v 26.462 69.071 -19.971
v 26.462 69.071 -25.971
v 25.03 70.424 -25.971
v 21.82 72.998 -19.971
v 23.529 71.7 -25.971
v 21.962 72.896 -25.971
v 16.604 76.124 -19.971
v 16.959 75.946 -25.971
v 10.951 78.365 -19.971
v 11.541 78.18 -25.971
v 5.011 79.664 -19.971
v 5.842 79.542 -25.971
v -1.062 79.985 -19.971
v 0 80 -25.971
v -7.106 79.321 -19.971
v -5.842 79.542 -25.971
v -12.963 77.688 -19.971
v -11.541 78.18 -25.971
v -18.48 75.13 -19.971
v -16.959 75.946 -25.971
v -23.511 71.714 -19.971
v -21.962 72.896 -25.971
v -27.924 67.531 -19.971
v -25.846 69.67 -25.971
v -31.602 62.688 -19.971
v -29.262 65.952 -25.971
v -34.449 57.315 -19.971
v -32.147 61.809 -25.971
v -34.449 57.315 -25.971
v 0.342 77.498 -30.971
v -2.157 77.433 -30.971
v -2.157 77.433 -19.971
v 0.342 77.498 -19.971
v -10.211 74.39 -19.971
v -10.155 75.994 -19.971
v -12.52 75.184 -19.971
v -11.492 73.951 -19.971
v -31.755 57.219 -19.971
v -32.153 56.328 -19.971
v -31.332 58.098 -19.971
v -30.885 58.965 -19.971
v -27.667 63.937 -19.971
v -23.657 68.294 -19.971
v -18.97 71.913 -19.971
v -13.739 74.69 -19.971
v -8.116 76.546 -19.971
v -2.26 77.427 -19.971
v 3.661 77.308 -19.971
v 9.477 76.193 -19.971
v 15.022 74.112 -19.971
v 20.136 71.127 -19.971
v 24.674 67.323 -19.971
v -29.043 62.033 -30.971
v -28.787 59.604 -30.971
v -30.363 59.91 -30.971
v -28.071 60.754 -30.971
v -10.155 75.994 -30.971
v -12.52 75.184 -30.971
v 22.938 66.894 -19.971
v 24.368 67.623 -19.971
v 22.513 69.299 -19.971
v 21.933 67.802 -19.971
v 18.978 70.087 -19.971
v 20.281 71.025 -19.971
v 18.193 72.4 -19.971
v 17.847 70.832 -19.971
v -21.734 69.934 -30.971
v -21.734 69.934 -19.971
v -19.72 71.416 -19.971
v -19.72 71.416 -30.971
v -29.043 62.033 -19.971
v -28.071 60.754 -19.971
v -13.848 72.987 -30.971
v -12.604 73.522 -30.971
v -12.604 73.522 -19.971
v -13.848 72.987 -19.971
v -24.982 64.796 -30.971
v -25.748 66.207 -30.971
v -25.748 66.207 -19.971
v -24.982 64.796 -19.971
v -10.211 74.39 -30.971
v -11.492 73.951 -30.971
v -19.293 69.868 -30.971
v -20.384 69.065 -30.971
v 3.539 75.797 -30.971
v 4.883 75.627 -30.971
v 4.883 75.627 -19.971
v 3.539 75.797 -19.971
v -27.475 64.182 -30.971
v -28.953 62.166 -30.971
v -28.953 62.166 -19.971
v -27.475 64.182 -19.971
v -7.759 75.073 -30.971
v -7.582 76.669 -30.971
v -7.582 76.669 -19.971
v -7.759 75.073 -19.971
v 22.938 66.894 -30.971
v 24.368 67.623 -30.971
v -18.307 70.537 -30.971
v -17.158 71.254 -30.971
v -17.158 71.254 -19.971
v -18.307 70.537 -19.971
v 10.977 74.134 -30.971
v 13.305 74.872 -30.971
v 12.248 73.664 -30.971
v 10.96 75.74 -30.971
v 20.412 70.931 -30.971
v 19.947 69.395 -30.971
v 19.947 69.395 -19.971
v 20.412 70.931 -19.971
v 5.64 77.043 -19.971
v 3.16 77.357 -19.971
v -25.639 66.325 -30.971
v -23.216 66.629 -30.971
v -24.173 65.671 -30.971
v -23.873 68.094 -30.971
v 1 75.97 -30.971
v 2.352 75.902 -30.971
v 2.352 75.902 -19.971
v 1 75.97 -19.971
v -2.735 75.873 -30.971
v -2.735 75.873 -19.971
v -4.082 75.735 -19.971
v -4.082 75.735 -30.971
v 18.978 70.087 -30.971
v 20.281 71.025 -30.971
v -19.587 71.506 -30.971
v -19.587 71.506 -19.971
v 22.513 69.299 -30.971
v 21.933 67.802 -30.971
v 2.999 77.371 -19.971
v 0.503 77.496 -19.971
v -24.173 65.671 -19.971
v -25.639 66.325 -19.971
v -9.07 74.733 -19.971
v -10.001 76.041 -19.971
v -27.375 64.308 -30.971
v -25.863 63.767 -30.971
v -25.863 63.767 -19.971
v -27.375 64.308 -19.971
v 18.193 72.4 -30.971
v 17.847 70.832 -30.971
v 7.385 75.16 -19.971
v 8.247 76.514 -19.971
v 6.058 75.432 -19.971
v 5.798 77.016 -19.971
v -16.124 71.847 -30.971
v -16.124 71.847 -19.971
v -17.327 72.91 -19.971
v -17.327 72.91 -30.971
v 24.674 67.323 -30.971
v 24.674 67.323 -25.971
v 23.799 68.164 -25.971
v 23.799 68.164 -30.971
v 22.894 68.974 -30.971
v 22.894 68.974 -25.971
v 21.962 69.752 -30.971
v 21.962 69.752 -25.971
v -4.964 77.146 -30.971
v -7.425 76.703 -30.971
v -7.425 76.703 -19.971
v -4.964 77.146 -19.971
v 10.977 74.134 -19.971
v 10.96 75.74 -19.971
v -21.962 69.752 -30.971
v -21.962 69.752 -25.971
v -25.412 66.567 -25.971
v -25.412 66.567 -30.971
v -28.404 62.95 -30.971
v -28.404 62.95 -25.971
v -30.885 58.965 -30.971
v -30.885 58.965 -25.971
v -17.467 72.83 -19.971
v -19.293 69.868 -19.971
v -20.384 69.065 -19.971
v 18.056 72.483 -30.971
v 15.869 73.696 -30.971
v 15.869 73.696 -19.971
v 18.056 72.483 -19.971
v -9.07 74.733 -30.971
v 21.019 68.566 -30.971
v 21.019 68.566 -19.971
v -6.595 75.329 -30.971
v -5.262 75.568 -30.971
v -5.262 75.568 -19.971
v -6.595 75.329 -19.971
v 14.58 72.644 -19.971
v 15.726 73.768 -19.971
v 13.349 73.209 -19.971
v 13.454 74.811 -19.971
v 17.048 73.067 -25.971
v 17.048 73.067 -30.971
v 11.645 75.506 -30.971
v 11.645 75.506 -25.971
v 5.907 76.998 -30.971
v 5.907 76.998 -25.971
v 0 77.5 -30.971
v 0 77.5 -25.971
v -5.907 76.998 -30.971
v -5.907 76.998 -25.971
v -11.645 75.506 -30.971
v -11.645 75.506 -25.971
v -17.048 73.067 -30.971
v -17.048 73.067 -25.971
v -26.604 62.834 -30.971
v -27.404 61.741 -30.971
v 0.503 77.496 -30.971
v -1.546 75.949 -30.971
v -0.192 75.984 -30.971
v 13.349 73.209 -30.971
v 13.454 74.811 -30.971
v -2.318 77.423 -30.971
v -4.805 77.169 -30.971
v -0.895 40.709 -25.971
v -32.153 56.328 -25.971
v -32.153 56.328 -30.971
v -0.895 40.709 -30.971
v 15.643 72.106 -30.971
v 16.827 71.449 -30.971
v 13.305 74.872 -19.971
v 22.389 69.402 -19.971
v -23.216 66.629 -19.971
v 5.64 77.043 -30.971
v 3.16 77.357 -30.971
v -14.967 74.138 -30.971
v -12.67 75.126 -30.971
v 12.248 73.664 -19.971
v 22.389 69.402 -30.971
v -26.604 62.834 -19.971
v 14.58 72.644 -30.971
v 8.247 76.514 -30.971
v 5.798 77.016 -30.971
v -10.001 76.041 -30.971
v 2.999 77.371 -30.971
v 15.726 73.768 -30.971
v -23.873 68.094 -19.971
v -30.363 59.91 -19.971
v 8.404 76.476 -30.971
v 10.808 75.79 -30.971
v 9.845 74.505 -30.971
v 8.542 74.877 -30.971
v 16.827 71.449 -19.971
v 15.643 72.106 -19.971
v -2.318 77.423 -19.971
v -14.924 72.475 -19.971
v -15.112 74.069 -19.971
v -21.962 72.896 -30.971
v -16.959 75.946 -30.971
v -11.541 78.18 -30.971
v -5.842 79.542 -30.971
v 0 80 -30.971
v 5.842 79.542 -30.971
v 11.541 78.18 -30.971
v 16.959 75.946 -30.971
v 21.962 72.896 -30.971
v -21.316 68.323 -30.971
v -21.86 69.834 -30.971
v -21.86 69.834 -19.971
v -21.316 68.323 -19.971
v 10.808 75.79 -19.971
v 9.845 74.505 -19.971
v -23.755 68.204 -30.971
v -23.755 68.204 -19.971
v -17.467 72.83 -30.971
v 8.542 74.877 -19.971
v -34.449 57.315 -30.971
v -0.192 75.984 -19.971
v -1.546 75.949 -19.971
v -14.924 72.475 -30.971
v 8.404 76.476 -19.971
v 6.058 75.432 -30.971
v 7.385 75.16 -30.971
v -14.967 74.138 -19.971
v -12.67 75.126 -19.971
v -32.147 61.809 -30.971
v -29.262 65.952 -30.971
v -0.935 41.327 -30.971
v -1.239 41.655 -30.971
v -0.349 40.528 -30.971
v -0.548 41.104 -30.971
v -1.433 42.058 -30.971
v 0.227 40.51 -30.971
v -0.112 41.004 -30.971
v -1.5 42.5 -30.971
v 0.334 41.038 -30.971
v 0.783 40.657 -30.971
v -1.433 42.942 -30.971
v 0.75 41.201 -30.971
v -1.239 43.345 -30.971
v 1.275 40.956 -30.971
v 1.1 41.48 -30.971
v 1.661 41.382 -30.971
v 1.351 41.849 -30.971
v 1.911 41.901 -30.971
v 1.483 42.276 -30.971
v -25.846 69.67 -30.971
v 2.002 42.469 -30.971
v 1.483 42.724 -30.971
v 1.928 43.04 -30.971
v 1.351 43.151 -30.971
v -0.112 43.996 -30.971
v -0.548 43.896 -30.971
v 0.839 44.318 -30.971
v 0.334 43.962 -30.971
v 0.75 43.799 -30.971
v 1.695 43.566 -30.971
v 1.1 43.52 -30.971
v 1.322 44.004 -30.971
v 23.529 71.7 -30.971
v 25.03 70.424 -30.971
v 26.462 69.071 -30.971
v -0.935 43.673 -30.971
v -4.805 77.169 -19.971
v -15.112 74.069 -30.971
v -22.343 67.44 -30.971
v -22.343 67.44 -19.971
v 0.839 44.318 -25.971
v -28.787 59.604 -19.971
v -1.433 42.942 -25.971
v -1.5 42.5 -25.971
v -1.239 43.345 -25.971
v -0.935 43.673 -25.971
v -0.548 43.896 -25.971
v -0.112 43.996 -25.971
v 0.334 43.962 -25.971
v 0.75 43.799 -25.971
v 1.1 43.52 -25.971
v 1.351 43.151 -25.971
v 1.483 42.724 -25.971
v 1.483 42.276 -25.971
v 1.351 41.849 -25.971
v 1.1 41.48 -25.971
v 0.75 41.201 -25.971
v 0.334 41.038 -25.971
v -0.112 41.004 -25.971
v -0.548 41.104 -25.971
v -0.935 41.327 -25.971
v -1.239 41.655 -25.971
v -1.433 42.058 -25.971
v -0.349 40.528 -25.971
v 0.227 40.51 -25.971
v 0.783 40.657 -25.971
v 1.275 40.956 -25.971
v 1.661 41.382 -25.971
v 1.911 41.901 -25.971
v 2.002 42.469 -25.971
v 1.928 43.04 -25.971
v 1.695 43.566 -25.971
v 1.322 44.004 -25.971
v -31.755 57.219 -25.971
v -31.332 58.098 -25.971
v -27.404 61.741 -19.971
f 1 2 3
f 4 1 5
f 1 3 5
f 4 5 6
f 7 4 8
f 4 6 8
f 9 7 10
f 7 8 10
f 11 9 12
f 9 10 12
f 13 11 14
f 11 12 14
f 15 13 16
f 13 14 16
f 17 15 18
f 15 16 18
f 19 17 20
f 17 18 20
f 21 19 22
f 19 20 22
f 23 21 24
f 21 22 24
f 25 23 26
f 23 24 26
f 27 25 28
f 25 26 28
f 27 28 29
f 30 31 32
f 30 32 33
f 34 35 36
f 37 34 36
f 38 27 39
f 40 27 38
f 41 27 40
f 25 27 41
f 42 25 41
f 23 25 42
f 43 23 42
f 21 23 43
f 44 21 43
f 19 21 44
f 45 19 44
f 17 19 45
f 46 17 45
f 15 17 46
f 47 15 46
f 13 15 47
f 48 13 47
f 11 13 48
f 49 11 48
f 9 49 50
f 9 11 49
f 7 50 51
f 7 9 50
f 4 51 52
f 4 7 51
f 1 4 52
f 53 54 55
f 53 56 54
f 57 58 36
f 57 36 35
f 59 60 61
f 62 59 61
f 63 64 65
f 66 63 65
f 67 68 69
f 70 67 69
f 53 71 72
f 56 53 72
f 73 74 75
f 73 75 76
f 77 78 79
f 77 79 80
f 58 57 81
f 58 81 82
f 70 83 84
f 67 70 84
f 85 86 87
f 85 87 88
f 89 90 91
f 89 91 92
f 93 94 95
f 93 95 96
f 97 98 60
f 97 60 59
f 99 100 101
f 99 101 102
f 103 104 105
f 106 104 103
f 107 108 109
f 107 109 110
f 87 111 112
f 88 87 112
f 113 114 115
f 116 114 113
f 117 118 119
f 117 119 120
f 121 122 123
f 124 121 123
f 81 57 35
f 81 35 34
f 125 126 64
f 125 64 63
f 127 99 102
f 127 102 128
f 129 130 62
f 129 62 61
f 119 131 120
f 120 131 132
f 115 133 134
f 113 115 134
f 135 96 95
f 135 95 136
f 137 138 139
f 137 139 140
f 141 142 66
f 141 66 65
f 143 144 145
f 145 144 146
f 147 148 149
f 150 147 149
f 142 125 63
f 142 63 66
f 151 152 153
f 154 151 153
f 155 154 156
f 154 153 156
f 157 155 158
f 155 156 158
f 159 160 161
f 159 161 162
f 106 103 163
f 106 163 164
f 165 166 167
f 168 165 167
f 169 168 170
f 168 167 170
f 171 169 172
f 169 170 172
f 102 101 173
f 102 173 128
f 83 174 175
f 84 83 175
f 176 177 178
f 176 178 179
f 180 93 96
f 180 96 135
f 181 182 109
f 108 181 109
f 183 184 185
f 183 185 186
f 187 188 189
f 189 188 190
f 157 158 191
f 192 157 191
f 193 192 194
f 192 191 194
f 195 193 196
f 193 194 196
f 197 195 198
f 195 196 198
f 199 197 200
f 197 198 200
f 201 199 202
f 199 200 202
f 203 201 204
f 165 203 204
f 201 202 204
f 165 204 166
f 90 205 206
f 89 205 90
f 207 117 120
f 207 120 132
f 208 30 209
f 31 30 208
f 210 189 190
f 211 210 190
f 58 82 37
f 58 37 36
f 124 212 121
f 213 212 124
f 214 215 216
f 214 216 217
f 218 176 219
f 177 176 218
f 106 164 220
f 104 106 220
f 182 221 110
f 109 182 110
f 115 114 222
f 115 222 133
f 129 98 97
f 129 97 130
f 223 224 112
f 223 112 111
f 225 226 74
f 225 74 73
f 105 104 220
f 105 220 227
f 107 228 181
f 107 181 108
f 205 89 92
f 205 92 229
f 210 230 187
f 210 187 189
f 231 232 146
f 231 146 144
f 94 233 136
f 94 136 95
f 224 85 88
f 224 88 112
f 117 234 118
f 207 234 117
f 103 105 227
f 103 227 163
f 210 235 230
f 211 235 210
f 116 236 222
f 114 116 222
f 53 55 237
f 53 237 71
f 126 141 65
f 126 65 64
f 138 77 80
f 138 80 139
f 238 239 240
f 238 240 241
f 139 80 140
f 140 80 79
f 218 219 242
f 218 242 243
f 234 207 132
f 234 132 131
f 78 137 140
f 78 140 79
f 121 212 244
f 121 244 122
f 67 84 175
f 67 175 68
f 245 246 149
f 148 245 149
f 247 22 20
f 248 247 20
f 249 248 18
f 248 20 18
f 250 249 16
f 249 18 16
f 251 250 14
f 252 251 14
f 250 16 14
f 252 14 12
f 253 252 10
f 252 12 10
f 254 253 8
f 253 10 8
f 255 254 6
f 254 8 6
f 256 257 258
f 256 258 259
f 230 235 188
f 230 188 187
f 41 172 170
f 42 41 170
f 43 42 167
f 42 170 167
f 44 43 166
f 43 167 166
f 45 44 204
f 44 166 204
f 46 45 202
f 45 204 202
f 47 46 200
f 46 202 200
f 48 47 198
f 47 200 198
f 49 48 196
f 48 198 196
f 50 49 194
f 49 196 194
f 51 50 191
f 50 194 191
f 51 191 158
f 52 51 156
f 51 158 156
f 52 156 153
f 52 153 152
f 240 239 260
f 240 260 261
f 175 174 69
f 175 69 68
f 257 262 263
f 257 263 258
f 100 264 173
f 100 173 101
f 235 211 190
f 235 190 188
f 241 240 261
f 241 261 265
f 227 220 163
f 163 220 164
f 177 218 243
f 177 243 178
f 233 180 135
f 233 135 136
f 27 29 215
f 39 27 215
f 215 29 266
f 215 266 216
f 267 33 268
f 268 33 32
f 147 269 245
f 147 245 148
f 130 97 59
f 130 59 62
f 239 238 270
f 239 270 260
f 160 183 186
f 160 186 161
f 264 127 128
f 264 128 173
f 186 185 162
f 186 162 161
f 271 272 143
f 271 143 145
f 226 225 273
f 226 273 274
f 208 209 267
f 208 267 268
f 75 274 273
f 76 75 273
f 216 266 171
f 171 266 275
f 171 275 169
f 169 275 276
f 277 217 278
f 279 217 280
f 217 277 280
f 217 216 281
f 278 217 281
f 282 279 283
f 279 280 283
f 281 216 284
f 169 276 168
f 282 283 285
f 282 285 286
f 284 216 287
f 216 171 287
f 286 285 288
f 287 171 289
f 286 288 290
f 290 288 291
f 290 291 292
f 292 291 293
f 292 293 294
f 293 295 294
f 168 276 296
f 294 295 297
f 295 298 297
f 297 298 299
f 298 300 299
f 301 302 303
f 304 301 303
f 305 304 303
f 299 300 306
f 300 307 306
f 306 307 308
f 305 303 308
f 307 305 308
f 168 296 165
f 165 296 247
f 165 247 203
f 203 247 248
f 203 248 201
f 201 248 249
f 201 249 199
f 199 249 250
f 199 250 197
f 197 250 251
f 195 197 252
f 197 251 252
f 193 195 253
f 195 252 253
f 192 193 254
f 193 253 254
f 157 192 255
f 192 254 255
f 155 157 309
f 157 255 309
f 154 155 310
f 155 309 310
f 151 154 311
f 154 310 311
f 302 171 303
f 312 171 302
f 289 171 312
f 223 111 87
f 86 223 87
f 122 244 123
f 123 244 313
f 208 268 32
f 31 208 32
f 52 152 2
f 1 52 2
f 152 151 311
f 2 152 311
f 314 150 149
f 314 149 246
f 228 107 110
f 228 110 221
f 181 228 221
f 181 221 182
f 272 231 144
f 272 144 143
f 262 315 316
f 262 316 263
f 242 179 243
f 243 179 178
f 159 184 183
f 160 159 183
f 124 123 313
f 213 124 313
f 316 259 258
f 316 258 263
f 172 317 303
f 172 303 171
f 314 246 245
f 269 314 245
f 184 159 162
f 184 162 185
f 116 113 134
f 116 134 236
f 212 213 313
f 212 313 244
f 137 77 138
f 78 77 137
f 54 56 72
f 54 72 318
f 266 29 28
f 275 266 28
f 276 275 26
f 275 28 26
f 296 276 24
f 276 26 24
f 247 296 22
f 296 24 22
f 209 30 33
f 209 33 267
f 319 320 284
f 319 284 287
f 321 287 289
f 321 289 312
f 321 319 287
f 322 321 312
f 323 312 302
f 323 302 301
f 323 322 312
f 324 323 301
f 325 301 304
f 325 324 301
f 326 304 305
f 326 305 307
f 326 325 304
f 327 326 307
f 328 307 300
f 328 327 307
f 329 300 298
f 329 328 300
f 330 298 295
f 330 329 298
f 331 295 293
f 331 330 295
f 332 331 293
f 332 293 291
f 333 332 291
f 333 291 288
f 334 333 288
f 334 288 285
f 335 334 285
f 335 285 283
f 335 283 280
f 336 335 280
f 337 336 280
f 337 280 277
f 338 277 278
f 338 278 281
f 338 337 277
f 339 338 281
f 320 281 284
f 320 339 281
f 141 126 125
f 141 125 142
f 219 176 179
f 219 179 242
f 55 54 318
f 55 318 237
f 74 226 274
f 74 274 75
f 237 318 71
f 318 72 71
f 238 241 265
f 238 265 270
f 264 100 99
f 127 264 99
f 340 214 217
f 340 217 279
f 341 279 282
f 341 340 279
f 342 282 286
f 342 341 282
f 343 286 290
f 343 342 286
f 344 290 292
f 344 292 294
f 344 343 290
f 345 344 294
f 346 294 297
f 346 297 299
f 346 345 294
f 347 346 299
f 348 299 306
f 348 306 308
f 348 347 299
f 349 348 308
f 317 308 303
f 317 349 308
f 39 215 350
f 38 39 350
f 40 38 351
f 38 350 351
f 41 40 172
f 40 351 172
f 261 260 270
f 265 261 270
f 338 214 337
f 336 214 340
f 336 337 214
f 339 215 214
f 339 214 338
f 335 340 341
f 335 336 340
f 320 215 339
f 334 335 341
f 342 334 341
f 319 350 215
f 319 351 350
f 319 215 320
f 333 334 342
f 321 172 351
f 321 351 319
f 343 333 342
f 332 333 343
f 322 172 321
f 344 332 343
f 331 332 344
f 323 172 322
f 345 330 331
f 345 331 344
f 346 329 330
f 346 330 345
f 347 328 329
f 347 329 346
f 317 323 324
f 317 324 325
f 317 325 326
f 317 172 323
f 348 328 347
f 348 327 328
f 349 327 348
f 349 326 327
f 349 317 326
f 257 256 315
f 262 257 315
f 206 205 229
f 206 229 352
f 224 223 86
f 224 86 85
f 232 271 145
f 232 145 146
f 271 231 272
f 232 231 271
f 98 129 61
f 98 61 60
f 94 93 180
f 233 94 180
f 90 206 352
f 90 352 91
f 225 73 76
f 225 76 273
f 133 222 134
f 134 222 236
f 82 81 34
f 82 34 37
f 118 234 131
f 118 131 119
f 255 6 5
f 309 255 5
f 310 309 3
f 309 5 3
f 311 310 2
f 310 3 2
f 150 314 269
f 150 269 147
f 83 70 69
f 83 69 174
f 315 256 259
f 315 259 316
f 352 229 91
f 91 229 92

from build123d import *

# Parameters (mm, degrees)
BOSS_EXTRUDE1_DEPTH    = 5
BOSS_EXTRUDE2_DEPTH    = 11
BOSS_EXTRUDE2_2_DEPTH  = 11
BOSS_EXTRUDE2_3_DEPTH  = 11
BOSS_EXTRUDE2_4_DEPTH  = 11
BOSS_EXTRUDE2_5_DEPTH  = 11
BOSS_EXTRUDE2_6_DEPTH  = 11
BOSS_EXTRUDE2_7_DEPTH  = 11
BOSS_EXTRUDE2_8_DEPTH  = 11
BOSS_EXTRUDE2_9_DEPTH  = 11
BOSS_EXTRUDE2_10_DEPTH = 11
BOSS_EXTRUDE2_11_DEPTH = 11
BOSS_EXTRUDE2_12_DEPTH = 11
BOSS_EXTRUDE2_13_DEPTH = 11
BOSS_EXTRUDE2_14_DEPTH = 11
BOSS_EXTRUDE2_15_DEPTH = 11
BOSS_EXTRUDE2_16_DEPTH = 11
BOSS_EXTRUDE2_17_DEPTH = 11
BOSS_EXTRUDE2_18_DEPTH = 11
BOSS_EXTRUDE2_19_DEPTH = 11
BOSS_EXTRUDE2_20_DEPTH = 11
BOSS_EXTRUDE2_21_DEPTH = 11
BOSS_EXTRUDE2_22_DEPTH = 11
BOSS_EXTRUDE2_23_DEPTH = 11
BOSS_EXTRUDE2_24_DEPTH = 11
SKETCH5_R              = 1.5
BOSS_EXTRUDE8_DEPTH    = 5
BOSS_EXTRUDE9_DEPTH    = 6


with BuildPart() as part:
    # Sketch3 → Boss-Extrude1 (new body)
    with BuildSketch(Plane(origin=(0, 0, -25.970633743), x_dir=(-1, 0, 0), z_dir=(0, 0, -1))):
        with BuildLine():
            Line((21.962493028, 72.895705289), (21.962493028, 69.751585275))
            ThreePointArc((21.962493028, 69.751585275), (27.877617379, 63.662193868), (32.152641561, 56.327785096))
            Line((32.152641561, 56.327785096), (34.449258815, 57.315484031))
            ThreePointArc((34.449258815, 57.315484031), (29.261873831, 65.951924012), (21.962493028, 72.895705289))
        make_face()
        with BuildLine():
            Line((-21.962493028, 72.895705289), (-21.962493028, 69.751585275))
            ThreePointArc((-21.962493028, 69.751585275), (0, 77.5), (21.962493028, 69.751585275))
            Line((21.962493028, 69.751585275), (21.962493028, 72.895705289))
            ThreePointArc((21.962493028, 72.895705289), (0, 80), (-21.962493028, 72.895705289))
        make_face()
        with BuildLine():
            ThreePointArc((-24.674429164, 67.322823075), (-23.350061014, 68.572488386), (-21.962493028, 69.751585275))
            Line((-21.962493028, 69.751585275), (-21.962493028, 72.895705289))
            ThreePointArc((-21.962493028, 72.895705289), (-24.287766799, 71.071916), (-26.462208479, 69.07068916))
            Line((-26.462208479, 69.07068916), (-24.674429164, 67.322823075))
        make_face()
    extrude(amount=BOSS_EXTRUDE1_DEPTH)

    # Sketch5 → Boss-Extrude8 (add)
    with BuildSketch(Plane(origin=(0, 0, -25.970633743), x_dir=(-1, 0, 0), z_dir=(0, 0, -1))):
        with BuildLine():
            Line((32.152641561, 56.327785096), (0.895059482, 40.708761567))
            ThreePointArc((0.895059482, 40.708761567), (-1.8048341, 41.632682024), (-0.83937002, 44.318000156))
            Line((-0.83937002, 44.318000156), (30.896006649, 58.970212188))
            Line((30.896006649, 58.970212188), (30.993391948, 59.013023922))
            Line((30.993391948, 59.013023922), (32.238400019, 56.371276085))
            Line((32.238400019, 56.371276085), (32.152641561, 56.327785096))
        make_face()
        with Locations((0, 42.5)):
            Circle(SKETCH5_R, mode=Mode.SUBTRACT)
    extrude(amount=BOSS_EXTRUDE8_DEPTH)

    # Sketch6 → Boss-Extrude9 (add)
    with BuildSketch(Plane.XY.offset(-25.970633743)):
        with BuildLine():
            Line((24.674429164, 67.322823075), (26.462208479, 69.07068916))
            ThreePointArc((26.462208479, 69.07068916), (-7.105945059, 79.320585884), (-34.449258815, 57.315484031))
            Line((-34.449258815, 57.315484031), (-32.152641561, 56.327785096))
            ThreePointArc((-32.152641561, 56.327785096), (-31.546501322, 57.659757728), (-30.885211177, 58.965227922))
            ThreePointArc((-30.885211177, 58.965227922), (-5.206323318, 77.110608164), (24.674429164, 67.322823075))
        make_face()
    extrude(amount=BOSS_EXTRUDE9_DEPTH)


with BuildPart() as body_2:
    # Sketch4 → Boss-Extrude2 (new body)
    with BuildSketch(Plane(origin=(0, 0, -30.970633743), x_dir=(-1, 0, 0), z_dir=(0, 0, -1))):
        Polygon((-22.512842113, 69.298730194), (-24.36838523, 67.623331811), (-22.937994157, 66.893882252), (-21.932755127, 67.801528013), align=None)
    extrude(amount=-BOSS_EXTRUDE2_DEPTH)


with BuildPart() as body_3:
    # Sketch4 → Boss-Extrude2 2 (new body)
    with BuildSketch(Plane(origin=(0, 0, -30.970633743), x_dir=(-1, 0, 0), z_dir=(0, 0, -1))):
        Polygon((-19.947351518, 69.394539123), (-20.412027485, 70.931481389), (-22.389480506, 69.401880281), (-21.018635143, 68.565878922), align=None)
    extrude(amount=-BOSS_EXTRUDE2_2_DEPTH)


with BuildPart() as body_4:
    # Sketch4 → Boss-Extrude2 3 (new body)
    with BuildSketch(Plane(origin=(0, 0, -30.970633743), x_dir=(-1, 0, 0), z_dir=(0, 0, -1))):
        Polygon((-17.846671781, 70.832126174), (-18.193251357, 72.399926506), (-20.281186543, 71.024962268), (-18.977809033, 70.087240376), align=None)
    extrude(amount=-BOSS_EXTRUDE2_3_DEPTH)


with BuildPart() as body_5:
    # Sketch4 → Boss-Extrude2 4 (new body)
    with BuildSketch(Plane(origin=(0, 0, -30.970633743), x_dir=(-1, 0, 0), z_dir=(0, 0, -1))):
        Polygon((-15.642855785, 72.105981324), (-15.869336079, 73.695579373), (-18.055687213, 72.483197949), (-16.827309799, 71.449174637), align=None)
    extrude(amount=-BOSS_EXTRUDE2_4_DEPTH)


with BuildPart() as body_6:
    # Sketch4 → Boss-Extrude2 5 (new body)
    with BuildSketch(Plane(origin=(0, 0, -30.970633743), x_dir=(-1, 0, 0), z_dir=(0, 0, -1))):
        Polygon((-13.348639424, 73.208742937), (-13.453711603, 74.810952386), (-15.72584372, 73.768160152), (-14.579565218, 72.643811061), align=None)
    extrude(amount=-BOSS_EXTRUDE2_5_DEPTH)


with BuildPart() as body_7:
    # Sketch4 → Boss-Extrude2 6 (new body)
    with BuildSketch(Plane(origin=(0, 0, -30.970633743), x_dir=(-1, 0, 0), z_dir=(0, 0, -1))):
        Polygon((-10.977281019, 74.134038134), (-10.960337868, 75.739599784), (-13.305120273, 74.872423056), (-12.247565049, 73.664245821), align=None)
    extrude(amount=-BOSS_EXTRUDE2_6_DEPTH)


with BuildPart() as body_8:
    # Sketch4 → Boss-Extrude2 7 (new body)
    with BuildSketch(Plane(origin=(0, 0, -30.970633743), x_dir=(-1, 0, 0), z_dir=(0, 0, -1))):
        Polygon((-8.542484695, 74.876519616), (-8.403624131, 76.476154895), (-10.807506279, 75.789605105), (-9.844785966, 74.504581805), align=None)
    extrude(amount=-BOSS_EXTRUDE2_7_DEPTH)


with BuildPart() as body_9:
    # Sketch4 → Boss-Extrude2 8 (new body)
    with BuildSketch(Plane(origin=(0, 0, -30.970633743), x_dir=(-1, 0, 0), z_dir=(0, 0, -1))):
        Polygon((-6.058321189, 75.431896569), (-5.798345687, 77.016361154), (-8.2474355, 76.514405885), (-7.385113675, 75.159962695), align=None)
    extrude(amount=-BOSS_EXTRUDE2_8_DEPTH)


with BuildPart() as body_10:
    # Sketch4 → Boss-Extrude2 9 (new body)
    with BuildSketch(Plane(origin=(0, 0, -30.970633743), x_dir=(-1, 0, 0), z_dir=(0, 0, -1))):
        Polygon((-3.539146527, 75.796959457), (-3.159558493, 77.357096697), (-5.639702631, 77.042636759), (-4.882762671, 75.626601032), align=None)
    extrude(amount=-BOSS_EXTRUDE2_9_DEPTH)


with BuildPart() as body_11:
    # Sketch4 → Boss-Extrude2 10 (new body)
    with BuildSketch(Plane(origin=(0, 0, -30.970633743), x_dir=(-1, 0, 0), z_dir=(0, 0, -1))):
        Polygon((-0.99951907, 75.969598576), (-0.502512149, 77.496392408), (-2.999377813, 77.37124507), (-2.352194087, 75.901800104), align=None)
    extrude(amount=-BOSS_EXTRUDE2_10_DEPTH)


with BuildPart() as body_12:
    # Sketch4 → Boss-Extrude2 11 (new body)
    with BuildSketch(Plane(origin=(0, 0, -30.970633743), x_dir=(-1, 0, 0), z_dir=(0, 0, -1))):
        Polygon((1.545884627, 75.948816241), (2.157438222, 77.433443293), (-0.341719532, 77.498331785), (0.191967872, 75.983969531), align=None)
    extrude(amount=-BOSS_EXTRUDE2_11_DEPTH)


with BuildPart() as body_13:
    # Sketch4 → Boss-Extrude2 12 (new body)
    with BuildSketch(Plane(origin=(0, 0, -30.970633743), x_dir=(-1, 0, 0), z_dir=(0, 0, -1))):
        Polygon((4.082354628, 75.734732554), (4.804920717, 77.168613138), (2.317913552, 77.423162468), (2.735020445, 75.872634454), align=None)
    extrude(amount=-BOSS_EXTRUDE2_12_DEPTH)


with BuildPart() as body_14:
    # Sketch4 → Boss-Extrude2 13 (new body)
    with BuildSketch(Plane(origin=(0, 0, -30.970633743), x_dir=(-1, 0, 0), z_dir=(0, 0, -1))):
        Polygon((6.595232622, 75.328584708), (7.424635482, 76.7034324), (4.964151369, 77.146171523), (5.262267282, 75.56843828), align=None)
    extrude(amount=-BOSS_EXTRUDE2_13_DEPTH)


with BuildPart() as body_15:
    # Sketch4 → Boss-Extrude2 14 (new body)
    with BuildSketch(Plane(origin=(0, 0, -30.970633743), x_dir=(-1, 0, 0), z_dir=(0, 0, -1))):
        Polygon((9.06999664, 74.732719839), (10.001443135, 76.040589369), (7.58170126, 76.668959686), (7.759103375, 75.073138965), align=None)
    extrude(amount=-BOSS_EXTRUDE2_14_DEPTH)


with BuildPart() as body_16:
    # Sketch4 → Boss-Extrude2 15 (new body)
    with BuildSketch(Plane(origin=(0, 0, -30.970633743), x_dir=(-1, 0, 0), z_dir=(0, 0, -1))):
        Polygon((11.492344973, 73.950581461), (12.520452257, 75.183914626), (10.155436353, 75.994284773), (10.21109946, 74.389598854), align=None)
    extrude(amount=-BOSS_EXTRUDE2_15_DEPTH)


with BuildPart() as body_17:
    # Sketch4 → Boss-Extrude2 16 (new body)
    with BuildSketch(Plane(origin=(0, 0, -30.970633743), x_dir=(-1, 0, 0), z_dir=(0, 0, -1))):
        Polygon((13.848278823, 72.986689569), (14.967105444, 74.138358912), (12.670482985, 75.126045745), (12.604085406, 73.521768137), align=None)
    extrude(amount=-BOSS_EXTRUDE2_16_DEPTH)


with BuildPart() as body_18:
    # Sketch4 → Boss-Extrude2 17 (new body)
    with BuildSketch(Plane(origin=(0, 0, -30.970633743), x_dir=(-1, 0, 0), z_dir=(0, 0, -1))):
        Polygon((16.124183204, 71.846614511), (17.32726344, 72.909964513), (15.112306651, 74.06926017), (14.924232099, 72.474662025), align=None)
    extrude(amount=-BOSS_EXTRUDE2_17_DEPTH)


with BuildPart() as body_19:
    # Sketch4 → Boss-Extrude2 18 (new body)
    with BuildSketch(Plane(origin=(0, 0, -30.970633743), x_dir=(-1, 0, 0), z_dir=(0, 0, -1))):
        Polygon((18.306905619, 70.536944803), (19.587286848, 71.505830344), (17.466796006, 72.830035234), (17.158131367, 71.254331764), align=None)
    extrude(amount=-BOSS_EXTRUDE2_18_DEPTH)


with BuildPart() as body_20:
    # Sketch4 → Boss-Extrude2 19 (new body)
    with BuildSketch(Plane(origin=(0, 0, -30.970633743), x_dir=(-1, 0, 0), z_dir=(0, 0, -1))):
        Polygon((20.383832075, 69.065249052), (21.734114948, 69.934070923), (19.720344412, 71.41553244), (19.292873465, 69.867829667), align=None)
    extrude(amount=-BOSS_EXTRUDE2_19_DEPTH)


with BuildPart() as body_21:
    # Sketch4 → Boss-Extrude2 20 (new body)
    with BuildSketch(Plane(origin=(0, 0, -30.970633743), x_dir=(-1, 0, 0), z_dir=(0, 0, -1))):
        Polygon((22.342959973, 67.440032215), (23.75534118, 68.203769479), (21.859928567, 69.833926228), (21.316121675, 68.323168356), align=None)
    extrude(amount=-BOSS_EXTRUDE2_20_DEPTH)


with BuildPart() as body_22:
    # Sketch4 → Boss-Extrude2 21 (new body)
    with BuildSketch(Plane(origin=(0, 0, -30.970633743), x_dir=(-1, 0, 0), z_dir=(0, 0, -1))):
        Polygon((24.172967476, 65.670686452), (25.639284838, 66.324925456), (23.873183775, 68.09435673), (23.216183609, 66.629274458), align=None)
    extrude(amount=-BOSS_EXTRUDE2_21_DEPTH)


with BuildPart() as body_23:
    # Sketch4 → Boss-Extrude2 22 (new body)
    with BuildSketch(Plane(origin=(0, 0, -30.970633743), x_dir=(-1, 0, 0), z_dir=(0, 0, -1))):
        Polygon((25.863278934, 63.767436846), (27.375058576, 64.308396731), (25.748475395, 66.206876953), (24.98207877, 64.795937019), align=None)
    extrude(amount=-BOSS_EXTRUDE2_22_DEPTH)


with BuildPart() as body_24:
    # Sketch4 → Boss-Extrude2 23 (new body)
    with BuildSketch(Plane(origin=(0, 0, -30.970633743), x_dir=(-1, 0, 0), z_dir=(0, 0, -1))):
        Polygon((27.404126006, 61.741282314), (28.952631324, 62.165836861), (27.474966079, 64.182394677), (26.603602018, 62.833750931), align=None)
    extrude(amount=-BOSS_EXTRUDE2_23_DEPTH)


with BuildPart() as body_25:
    # Sketch4 → Boss-Extrude2 24 (new body)
    with BuildSketch(Plane(origin=(0, 0, -30.970633743), x_dir=(-1, 0, 0), z_dir=(0, 0, -1))):
        Polygon((28.786604106, 59.603932041), (30.362886258, 59.909627742), (29.042678407, 62.032609426), (28.071382537, 60.754055705), align=None)
    extrude(amount=-BOSS_EXTRUDE2_24_DEPTH)


solid = Compound([part.part, body_2.part, body_3.part, body_4.part, body_5.part, body_6.part, body_7.part, body_8.part, body_9.part, body_10.part, body_11.part, body_12.part, body_13.part, body_14.part, body_15.part, body_16.part, body_17.part, body_18.part, body_19.part, body_20.part, body_21.part, body_22.part, body_23.part, body_24.part, body_25.part])
